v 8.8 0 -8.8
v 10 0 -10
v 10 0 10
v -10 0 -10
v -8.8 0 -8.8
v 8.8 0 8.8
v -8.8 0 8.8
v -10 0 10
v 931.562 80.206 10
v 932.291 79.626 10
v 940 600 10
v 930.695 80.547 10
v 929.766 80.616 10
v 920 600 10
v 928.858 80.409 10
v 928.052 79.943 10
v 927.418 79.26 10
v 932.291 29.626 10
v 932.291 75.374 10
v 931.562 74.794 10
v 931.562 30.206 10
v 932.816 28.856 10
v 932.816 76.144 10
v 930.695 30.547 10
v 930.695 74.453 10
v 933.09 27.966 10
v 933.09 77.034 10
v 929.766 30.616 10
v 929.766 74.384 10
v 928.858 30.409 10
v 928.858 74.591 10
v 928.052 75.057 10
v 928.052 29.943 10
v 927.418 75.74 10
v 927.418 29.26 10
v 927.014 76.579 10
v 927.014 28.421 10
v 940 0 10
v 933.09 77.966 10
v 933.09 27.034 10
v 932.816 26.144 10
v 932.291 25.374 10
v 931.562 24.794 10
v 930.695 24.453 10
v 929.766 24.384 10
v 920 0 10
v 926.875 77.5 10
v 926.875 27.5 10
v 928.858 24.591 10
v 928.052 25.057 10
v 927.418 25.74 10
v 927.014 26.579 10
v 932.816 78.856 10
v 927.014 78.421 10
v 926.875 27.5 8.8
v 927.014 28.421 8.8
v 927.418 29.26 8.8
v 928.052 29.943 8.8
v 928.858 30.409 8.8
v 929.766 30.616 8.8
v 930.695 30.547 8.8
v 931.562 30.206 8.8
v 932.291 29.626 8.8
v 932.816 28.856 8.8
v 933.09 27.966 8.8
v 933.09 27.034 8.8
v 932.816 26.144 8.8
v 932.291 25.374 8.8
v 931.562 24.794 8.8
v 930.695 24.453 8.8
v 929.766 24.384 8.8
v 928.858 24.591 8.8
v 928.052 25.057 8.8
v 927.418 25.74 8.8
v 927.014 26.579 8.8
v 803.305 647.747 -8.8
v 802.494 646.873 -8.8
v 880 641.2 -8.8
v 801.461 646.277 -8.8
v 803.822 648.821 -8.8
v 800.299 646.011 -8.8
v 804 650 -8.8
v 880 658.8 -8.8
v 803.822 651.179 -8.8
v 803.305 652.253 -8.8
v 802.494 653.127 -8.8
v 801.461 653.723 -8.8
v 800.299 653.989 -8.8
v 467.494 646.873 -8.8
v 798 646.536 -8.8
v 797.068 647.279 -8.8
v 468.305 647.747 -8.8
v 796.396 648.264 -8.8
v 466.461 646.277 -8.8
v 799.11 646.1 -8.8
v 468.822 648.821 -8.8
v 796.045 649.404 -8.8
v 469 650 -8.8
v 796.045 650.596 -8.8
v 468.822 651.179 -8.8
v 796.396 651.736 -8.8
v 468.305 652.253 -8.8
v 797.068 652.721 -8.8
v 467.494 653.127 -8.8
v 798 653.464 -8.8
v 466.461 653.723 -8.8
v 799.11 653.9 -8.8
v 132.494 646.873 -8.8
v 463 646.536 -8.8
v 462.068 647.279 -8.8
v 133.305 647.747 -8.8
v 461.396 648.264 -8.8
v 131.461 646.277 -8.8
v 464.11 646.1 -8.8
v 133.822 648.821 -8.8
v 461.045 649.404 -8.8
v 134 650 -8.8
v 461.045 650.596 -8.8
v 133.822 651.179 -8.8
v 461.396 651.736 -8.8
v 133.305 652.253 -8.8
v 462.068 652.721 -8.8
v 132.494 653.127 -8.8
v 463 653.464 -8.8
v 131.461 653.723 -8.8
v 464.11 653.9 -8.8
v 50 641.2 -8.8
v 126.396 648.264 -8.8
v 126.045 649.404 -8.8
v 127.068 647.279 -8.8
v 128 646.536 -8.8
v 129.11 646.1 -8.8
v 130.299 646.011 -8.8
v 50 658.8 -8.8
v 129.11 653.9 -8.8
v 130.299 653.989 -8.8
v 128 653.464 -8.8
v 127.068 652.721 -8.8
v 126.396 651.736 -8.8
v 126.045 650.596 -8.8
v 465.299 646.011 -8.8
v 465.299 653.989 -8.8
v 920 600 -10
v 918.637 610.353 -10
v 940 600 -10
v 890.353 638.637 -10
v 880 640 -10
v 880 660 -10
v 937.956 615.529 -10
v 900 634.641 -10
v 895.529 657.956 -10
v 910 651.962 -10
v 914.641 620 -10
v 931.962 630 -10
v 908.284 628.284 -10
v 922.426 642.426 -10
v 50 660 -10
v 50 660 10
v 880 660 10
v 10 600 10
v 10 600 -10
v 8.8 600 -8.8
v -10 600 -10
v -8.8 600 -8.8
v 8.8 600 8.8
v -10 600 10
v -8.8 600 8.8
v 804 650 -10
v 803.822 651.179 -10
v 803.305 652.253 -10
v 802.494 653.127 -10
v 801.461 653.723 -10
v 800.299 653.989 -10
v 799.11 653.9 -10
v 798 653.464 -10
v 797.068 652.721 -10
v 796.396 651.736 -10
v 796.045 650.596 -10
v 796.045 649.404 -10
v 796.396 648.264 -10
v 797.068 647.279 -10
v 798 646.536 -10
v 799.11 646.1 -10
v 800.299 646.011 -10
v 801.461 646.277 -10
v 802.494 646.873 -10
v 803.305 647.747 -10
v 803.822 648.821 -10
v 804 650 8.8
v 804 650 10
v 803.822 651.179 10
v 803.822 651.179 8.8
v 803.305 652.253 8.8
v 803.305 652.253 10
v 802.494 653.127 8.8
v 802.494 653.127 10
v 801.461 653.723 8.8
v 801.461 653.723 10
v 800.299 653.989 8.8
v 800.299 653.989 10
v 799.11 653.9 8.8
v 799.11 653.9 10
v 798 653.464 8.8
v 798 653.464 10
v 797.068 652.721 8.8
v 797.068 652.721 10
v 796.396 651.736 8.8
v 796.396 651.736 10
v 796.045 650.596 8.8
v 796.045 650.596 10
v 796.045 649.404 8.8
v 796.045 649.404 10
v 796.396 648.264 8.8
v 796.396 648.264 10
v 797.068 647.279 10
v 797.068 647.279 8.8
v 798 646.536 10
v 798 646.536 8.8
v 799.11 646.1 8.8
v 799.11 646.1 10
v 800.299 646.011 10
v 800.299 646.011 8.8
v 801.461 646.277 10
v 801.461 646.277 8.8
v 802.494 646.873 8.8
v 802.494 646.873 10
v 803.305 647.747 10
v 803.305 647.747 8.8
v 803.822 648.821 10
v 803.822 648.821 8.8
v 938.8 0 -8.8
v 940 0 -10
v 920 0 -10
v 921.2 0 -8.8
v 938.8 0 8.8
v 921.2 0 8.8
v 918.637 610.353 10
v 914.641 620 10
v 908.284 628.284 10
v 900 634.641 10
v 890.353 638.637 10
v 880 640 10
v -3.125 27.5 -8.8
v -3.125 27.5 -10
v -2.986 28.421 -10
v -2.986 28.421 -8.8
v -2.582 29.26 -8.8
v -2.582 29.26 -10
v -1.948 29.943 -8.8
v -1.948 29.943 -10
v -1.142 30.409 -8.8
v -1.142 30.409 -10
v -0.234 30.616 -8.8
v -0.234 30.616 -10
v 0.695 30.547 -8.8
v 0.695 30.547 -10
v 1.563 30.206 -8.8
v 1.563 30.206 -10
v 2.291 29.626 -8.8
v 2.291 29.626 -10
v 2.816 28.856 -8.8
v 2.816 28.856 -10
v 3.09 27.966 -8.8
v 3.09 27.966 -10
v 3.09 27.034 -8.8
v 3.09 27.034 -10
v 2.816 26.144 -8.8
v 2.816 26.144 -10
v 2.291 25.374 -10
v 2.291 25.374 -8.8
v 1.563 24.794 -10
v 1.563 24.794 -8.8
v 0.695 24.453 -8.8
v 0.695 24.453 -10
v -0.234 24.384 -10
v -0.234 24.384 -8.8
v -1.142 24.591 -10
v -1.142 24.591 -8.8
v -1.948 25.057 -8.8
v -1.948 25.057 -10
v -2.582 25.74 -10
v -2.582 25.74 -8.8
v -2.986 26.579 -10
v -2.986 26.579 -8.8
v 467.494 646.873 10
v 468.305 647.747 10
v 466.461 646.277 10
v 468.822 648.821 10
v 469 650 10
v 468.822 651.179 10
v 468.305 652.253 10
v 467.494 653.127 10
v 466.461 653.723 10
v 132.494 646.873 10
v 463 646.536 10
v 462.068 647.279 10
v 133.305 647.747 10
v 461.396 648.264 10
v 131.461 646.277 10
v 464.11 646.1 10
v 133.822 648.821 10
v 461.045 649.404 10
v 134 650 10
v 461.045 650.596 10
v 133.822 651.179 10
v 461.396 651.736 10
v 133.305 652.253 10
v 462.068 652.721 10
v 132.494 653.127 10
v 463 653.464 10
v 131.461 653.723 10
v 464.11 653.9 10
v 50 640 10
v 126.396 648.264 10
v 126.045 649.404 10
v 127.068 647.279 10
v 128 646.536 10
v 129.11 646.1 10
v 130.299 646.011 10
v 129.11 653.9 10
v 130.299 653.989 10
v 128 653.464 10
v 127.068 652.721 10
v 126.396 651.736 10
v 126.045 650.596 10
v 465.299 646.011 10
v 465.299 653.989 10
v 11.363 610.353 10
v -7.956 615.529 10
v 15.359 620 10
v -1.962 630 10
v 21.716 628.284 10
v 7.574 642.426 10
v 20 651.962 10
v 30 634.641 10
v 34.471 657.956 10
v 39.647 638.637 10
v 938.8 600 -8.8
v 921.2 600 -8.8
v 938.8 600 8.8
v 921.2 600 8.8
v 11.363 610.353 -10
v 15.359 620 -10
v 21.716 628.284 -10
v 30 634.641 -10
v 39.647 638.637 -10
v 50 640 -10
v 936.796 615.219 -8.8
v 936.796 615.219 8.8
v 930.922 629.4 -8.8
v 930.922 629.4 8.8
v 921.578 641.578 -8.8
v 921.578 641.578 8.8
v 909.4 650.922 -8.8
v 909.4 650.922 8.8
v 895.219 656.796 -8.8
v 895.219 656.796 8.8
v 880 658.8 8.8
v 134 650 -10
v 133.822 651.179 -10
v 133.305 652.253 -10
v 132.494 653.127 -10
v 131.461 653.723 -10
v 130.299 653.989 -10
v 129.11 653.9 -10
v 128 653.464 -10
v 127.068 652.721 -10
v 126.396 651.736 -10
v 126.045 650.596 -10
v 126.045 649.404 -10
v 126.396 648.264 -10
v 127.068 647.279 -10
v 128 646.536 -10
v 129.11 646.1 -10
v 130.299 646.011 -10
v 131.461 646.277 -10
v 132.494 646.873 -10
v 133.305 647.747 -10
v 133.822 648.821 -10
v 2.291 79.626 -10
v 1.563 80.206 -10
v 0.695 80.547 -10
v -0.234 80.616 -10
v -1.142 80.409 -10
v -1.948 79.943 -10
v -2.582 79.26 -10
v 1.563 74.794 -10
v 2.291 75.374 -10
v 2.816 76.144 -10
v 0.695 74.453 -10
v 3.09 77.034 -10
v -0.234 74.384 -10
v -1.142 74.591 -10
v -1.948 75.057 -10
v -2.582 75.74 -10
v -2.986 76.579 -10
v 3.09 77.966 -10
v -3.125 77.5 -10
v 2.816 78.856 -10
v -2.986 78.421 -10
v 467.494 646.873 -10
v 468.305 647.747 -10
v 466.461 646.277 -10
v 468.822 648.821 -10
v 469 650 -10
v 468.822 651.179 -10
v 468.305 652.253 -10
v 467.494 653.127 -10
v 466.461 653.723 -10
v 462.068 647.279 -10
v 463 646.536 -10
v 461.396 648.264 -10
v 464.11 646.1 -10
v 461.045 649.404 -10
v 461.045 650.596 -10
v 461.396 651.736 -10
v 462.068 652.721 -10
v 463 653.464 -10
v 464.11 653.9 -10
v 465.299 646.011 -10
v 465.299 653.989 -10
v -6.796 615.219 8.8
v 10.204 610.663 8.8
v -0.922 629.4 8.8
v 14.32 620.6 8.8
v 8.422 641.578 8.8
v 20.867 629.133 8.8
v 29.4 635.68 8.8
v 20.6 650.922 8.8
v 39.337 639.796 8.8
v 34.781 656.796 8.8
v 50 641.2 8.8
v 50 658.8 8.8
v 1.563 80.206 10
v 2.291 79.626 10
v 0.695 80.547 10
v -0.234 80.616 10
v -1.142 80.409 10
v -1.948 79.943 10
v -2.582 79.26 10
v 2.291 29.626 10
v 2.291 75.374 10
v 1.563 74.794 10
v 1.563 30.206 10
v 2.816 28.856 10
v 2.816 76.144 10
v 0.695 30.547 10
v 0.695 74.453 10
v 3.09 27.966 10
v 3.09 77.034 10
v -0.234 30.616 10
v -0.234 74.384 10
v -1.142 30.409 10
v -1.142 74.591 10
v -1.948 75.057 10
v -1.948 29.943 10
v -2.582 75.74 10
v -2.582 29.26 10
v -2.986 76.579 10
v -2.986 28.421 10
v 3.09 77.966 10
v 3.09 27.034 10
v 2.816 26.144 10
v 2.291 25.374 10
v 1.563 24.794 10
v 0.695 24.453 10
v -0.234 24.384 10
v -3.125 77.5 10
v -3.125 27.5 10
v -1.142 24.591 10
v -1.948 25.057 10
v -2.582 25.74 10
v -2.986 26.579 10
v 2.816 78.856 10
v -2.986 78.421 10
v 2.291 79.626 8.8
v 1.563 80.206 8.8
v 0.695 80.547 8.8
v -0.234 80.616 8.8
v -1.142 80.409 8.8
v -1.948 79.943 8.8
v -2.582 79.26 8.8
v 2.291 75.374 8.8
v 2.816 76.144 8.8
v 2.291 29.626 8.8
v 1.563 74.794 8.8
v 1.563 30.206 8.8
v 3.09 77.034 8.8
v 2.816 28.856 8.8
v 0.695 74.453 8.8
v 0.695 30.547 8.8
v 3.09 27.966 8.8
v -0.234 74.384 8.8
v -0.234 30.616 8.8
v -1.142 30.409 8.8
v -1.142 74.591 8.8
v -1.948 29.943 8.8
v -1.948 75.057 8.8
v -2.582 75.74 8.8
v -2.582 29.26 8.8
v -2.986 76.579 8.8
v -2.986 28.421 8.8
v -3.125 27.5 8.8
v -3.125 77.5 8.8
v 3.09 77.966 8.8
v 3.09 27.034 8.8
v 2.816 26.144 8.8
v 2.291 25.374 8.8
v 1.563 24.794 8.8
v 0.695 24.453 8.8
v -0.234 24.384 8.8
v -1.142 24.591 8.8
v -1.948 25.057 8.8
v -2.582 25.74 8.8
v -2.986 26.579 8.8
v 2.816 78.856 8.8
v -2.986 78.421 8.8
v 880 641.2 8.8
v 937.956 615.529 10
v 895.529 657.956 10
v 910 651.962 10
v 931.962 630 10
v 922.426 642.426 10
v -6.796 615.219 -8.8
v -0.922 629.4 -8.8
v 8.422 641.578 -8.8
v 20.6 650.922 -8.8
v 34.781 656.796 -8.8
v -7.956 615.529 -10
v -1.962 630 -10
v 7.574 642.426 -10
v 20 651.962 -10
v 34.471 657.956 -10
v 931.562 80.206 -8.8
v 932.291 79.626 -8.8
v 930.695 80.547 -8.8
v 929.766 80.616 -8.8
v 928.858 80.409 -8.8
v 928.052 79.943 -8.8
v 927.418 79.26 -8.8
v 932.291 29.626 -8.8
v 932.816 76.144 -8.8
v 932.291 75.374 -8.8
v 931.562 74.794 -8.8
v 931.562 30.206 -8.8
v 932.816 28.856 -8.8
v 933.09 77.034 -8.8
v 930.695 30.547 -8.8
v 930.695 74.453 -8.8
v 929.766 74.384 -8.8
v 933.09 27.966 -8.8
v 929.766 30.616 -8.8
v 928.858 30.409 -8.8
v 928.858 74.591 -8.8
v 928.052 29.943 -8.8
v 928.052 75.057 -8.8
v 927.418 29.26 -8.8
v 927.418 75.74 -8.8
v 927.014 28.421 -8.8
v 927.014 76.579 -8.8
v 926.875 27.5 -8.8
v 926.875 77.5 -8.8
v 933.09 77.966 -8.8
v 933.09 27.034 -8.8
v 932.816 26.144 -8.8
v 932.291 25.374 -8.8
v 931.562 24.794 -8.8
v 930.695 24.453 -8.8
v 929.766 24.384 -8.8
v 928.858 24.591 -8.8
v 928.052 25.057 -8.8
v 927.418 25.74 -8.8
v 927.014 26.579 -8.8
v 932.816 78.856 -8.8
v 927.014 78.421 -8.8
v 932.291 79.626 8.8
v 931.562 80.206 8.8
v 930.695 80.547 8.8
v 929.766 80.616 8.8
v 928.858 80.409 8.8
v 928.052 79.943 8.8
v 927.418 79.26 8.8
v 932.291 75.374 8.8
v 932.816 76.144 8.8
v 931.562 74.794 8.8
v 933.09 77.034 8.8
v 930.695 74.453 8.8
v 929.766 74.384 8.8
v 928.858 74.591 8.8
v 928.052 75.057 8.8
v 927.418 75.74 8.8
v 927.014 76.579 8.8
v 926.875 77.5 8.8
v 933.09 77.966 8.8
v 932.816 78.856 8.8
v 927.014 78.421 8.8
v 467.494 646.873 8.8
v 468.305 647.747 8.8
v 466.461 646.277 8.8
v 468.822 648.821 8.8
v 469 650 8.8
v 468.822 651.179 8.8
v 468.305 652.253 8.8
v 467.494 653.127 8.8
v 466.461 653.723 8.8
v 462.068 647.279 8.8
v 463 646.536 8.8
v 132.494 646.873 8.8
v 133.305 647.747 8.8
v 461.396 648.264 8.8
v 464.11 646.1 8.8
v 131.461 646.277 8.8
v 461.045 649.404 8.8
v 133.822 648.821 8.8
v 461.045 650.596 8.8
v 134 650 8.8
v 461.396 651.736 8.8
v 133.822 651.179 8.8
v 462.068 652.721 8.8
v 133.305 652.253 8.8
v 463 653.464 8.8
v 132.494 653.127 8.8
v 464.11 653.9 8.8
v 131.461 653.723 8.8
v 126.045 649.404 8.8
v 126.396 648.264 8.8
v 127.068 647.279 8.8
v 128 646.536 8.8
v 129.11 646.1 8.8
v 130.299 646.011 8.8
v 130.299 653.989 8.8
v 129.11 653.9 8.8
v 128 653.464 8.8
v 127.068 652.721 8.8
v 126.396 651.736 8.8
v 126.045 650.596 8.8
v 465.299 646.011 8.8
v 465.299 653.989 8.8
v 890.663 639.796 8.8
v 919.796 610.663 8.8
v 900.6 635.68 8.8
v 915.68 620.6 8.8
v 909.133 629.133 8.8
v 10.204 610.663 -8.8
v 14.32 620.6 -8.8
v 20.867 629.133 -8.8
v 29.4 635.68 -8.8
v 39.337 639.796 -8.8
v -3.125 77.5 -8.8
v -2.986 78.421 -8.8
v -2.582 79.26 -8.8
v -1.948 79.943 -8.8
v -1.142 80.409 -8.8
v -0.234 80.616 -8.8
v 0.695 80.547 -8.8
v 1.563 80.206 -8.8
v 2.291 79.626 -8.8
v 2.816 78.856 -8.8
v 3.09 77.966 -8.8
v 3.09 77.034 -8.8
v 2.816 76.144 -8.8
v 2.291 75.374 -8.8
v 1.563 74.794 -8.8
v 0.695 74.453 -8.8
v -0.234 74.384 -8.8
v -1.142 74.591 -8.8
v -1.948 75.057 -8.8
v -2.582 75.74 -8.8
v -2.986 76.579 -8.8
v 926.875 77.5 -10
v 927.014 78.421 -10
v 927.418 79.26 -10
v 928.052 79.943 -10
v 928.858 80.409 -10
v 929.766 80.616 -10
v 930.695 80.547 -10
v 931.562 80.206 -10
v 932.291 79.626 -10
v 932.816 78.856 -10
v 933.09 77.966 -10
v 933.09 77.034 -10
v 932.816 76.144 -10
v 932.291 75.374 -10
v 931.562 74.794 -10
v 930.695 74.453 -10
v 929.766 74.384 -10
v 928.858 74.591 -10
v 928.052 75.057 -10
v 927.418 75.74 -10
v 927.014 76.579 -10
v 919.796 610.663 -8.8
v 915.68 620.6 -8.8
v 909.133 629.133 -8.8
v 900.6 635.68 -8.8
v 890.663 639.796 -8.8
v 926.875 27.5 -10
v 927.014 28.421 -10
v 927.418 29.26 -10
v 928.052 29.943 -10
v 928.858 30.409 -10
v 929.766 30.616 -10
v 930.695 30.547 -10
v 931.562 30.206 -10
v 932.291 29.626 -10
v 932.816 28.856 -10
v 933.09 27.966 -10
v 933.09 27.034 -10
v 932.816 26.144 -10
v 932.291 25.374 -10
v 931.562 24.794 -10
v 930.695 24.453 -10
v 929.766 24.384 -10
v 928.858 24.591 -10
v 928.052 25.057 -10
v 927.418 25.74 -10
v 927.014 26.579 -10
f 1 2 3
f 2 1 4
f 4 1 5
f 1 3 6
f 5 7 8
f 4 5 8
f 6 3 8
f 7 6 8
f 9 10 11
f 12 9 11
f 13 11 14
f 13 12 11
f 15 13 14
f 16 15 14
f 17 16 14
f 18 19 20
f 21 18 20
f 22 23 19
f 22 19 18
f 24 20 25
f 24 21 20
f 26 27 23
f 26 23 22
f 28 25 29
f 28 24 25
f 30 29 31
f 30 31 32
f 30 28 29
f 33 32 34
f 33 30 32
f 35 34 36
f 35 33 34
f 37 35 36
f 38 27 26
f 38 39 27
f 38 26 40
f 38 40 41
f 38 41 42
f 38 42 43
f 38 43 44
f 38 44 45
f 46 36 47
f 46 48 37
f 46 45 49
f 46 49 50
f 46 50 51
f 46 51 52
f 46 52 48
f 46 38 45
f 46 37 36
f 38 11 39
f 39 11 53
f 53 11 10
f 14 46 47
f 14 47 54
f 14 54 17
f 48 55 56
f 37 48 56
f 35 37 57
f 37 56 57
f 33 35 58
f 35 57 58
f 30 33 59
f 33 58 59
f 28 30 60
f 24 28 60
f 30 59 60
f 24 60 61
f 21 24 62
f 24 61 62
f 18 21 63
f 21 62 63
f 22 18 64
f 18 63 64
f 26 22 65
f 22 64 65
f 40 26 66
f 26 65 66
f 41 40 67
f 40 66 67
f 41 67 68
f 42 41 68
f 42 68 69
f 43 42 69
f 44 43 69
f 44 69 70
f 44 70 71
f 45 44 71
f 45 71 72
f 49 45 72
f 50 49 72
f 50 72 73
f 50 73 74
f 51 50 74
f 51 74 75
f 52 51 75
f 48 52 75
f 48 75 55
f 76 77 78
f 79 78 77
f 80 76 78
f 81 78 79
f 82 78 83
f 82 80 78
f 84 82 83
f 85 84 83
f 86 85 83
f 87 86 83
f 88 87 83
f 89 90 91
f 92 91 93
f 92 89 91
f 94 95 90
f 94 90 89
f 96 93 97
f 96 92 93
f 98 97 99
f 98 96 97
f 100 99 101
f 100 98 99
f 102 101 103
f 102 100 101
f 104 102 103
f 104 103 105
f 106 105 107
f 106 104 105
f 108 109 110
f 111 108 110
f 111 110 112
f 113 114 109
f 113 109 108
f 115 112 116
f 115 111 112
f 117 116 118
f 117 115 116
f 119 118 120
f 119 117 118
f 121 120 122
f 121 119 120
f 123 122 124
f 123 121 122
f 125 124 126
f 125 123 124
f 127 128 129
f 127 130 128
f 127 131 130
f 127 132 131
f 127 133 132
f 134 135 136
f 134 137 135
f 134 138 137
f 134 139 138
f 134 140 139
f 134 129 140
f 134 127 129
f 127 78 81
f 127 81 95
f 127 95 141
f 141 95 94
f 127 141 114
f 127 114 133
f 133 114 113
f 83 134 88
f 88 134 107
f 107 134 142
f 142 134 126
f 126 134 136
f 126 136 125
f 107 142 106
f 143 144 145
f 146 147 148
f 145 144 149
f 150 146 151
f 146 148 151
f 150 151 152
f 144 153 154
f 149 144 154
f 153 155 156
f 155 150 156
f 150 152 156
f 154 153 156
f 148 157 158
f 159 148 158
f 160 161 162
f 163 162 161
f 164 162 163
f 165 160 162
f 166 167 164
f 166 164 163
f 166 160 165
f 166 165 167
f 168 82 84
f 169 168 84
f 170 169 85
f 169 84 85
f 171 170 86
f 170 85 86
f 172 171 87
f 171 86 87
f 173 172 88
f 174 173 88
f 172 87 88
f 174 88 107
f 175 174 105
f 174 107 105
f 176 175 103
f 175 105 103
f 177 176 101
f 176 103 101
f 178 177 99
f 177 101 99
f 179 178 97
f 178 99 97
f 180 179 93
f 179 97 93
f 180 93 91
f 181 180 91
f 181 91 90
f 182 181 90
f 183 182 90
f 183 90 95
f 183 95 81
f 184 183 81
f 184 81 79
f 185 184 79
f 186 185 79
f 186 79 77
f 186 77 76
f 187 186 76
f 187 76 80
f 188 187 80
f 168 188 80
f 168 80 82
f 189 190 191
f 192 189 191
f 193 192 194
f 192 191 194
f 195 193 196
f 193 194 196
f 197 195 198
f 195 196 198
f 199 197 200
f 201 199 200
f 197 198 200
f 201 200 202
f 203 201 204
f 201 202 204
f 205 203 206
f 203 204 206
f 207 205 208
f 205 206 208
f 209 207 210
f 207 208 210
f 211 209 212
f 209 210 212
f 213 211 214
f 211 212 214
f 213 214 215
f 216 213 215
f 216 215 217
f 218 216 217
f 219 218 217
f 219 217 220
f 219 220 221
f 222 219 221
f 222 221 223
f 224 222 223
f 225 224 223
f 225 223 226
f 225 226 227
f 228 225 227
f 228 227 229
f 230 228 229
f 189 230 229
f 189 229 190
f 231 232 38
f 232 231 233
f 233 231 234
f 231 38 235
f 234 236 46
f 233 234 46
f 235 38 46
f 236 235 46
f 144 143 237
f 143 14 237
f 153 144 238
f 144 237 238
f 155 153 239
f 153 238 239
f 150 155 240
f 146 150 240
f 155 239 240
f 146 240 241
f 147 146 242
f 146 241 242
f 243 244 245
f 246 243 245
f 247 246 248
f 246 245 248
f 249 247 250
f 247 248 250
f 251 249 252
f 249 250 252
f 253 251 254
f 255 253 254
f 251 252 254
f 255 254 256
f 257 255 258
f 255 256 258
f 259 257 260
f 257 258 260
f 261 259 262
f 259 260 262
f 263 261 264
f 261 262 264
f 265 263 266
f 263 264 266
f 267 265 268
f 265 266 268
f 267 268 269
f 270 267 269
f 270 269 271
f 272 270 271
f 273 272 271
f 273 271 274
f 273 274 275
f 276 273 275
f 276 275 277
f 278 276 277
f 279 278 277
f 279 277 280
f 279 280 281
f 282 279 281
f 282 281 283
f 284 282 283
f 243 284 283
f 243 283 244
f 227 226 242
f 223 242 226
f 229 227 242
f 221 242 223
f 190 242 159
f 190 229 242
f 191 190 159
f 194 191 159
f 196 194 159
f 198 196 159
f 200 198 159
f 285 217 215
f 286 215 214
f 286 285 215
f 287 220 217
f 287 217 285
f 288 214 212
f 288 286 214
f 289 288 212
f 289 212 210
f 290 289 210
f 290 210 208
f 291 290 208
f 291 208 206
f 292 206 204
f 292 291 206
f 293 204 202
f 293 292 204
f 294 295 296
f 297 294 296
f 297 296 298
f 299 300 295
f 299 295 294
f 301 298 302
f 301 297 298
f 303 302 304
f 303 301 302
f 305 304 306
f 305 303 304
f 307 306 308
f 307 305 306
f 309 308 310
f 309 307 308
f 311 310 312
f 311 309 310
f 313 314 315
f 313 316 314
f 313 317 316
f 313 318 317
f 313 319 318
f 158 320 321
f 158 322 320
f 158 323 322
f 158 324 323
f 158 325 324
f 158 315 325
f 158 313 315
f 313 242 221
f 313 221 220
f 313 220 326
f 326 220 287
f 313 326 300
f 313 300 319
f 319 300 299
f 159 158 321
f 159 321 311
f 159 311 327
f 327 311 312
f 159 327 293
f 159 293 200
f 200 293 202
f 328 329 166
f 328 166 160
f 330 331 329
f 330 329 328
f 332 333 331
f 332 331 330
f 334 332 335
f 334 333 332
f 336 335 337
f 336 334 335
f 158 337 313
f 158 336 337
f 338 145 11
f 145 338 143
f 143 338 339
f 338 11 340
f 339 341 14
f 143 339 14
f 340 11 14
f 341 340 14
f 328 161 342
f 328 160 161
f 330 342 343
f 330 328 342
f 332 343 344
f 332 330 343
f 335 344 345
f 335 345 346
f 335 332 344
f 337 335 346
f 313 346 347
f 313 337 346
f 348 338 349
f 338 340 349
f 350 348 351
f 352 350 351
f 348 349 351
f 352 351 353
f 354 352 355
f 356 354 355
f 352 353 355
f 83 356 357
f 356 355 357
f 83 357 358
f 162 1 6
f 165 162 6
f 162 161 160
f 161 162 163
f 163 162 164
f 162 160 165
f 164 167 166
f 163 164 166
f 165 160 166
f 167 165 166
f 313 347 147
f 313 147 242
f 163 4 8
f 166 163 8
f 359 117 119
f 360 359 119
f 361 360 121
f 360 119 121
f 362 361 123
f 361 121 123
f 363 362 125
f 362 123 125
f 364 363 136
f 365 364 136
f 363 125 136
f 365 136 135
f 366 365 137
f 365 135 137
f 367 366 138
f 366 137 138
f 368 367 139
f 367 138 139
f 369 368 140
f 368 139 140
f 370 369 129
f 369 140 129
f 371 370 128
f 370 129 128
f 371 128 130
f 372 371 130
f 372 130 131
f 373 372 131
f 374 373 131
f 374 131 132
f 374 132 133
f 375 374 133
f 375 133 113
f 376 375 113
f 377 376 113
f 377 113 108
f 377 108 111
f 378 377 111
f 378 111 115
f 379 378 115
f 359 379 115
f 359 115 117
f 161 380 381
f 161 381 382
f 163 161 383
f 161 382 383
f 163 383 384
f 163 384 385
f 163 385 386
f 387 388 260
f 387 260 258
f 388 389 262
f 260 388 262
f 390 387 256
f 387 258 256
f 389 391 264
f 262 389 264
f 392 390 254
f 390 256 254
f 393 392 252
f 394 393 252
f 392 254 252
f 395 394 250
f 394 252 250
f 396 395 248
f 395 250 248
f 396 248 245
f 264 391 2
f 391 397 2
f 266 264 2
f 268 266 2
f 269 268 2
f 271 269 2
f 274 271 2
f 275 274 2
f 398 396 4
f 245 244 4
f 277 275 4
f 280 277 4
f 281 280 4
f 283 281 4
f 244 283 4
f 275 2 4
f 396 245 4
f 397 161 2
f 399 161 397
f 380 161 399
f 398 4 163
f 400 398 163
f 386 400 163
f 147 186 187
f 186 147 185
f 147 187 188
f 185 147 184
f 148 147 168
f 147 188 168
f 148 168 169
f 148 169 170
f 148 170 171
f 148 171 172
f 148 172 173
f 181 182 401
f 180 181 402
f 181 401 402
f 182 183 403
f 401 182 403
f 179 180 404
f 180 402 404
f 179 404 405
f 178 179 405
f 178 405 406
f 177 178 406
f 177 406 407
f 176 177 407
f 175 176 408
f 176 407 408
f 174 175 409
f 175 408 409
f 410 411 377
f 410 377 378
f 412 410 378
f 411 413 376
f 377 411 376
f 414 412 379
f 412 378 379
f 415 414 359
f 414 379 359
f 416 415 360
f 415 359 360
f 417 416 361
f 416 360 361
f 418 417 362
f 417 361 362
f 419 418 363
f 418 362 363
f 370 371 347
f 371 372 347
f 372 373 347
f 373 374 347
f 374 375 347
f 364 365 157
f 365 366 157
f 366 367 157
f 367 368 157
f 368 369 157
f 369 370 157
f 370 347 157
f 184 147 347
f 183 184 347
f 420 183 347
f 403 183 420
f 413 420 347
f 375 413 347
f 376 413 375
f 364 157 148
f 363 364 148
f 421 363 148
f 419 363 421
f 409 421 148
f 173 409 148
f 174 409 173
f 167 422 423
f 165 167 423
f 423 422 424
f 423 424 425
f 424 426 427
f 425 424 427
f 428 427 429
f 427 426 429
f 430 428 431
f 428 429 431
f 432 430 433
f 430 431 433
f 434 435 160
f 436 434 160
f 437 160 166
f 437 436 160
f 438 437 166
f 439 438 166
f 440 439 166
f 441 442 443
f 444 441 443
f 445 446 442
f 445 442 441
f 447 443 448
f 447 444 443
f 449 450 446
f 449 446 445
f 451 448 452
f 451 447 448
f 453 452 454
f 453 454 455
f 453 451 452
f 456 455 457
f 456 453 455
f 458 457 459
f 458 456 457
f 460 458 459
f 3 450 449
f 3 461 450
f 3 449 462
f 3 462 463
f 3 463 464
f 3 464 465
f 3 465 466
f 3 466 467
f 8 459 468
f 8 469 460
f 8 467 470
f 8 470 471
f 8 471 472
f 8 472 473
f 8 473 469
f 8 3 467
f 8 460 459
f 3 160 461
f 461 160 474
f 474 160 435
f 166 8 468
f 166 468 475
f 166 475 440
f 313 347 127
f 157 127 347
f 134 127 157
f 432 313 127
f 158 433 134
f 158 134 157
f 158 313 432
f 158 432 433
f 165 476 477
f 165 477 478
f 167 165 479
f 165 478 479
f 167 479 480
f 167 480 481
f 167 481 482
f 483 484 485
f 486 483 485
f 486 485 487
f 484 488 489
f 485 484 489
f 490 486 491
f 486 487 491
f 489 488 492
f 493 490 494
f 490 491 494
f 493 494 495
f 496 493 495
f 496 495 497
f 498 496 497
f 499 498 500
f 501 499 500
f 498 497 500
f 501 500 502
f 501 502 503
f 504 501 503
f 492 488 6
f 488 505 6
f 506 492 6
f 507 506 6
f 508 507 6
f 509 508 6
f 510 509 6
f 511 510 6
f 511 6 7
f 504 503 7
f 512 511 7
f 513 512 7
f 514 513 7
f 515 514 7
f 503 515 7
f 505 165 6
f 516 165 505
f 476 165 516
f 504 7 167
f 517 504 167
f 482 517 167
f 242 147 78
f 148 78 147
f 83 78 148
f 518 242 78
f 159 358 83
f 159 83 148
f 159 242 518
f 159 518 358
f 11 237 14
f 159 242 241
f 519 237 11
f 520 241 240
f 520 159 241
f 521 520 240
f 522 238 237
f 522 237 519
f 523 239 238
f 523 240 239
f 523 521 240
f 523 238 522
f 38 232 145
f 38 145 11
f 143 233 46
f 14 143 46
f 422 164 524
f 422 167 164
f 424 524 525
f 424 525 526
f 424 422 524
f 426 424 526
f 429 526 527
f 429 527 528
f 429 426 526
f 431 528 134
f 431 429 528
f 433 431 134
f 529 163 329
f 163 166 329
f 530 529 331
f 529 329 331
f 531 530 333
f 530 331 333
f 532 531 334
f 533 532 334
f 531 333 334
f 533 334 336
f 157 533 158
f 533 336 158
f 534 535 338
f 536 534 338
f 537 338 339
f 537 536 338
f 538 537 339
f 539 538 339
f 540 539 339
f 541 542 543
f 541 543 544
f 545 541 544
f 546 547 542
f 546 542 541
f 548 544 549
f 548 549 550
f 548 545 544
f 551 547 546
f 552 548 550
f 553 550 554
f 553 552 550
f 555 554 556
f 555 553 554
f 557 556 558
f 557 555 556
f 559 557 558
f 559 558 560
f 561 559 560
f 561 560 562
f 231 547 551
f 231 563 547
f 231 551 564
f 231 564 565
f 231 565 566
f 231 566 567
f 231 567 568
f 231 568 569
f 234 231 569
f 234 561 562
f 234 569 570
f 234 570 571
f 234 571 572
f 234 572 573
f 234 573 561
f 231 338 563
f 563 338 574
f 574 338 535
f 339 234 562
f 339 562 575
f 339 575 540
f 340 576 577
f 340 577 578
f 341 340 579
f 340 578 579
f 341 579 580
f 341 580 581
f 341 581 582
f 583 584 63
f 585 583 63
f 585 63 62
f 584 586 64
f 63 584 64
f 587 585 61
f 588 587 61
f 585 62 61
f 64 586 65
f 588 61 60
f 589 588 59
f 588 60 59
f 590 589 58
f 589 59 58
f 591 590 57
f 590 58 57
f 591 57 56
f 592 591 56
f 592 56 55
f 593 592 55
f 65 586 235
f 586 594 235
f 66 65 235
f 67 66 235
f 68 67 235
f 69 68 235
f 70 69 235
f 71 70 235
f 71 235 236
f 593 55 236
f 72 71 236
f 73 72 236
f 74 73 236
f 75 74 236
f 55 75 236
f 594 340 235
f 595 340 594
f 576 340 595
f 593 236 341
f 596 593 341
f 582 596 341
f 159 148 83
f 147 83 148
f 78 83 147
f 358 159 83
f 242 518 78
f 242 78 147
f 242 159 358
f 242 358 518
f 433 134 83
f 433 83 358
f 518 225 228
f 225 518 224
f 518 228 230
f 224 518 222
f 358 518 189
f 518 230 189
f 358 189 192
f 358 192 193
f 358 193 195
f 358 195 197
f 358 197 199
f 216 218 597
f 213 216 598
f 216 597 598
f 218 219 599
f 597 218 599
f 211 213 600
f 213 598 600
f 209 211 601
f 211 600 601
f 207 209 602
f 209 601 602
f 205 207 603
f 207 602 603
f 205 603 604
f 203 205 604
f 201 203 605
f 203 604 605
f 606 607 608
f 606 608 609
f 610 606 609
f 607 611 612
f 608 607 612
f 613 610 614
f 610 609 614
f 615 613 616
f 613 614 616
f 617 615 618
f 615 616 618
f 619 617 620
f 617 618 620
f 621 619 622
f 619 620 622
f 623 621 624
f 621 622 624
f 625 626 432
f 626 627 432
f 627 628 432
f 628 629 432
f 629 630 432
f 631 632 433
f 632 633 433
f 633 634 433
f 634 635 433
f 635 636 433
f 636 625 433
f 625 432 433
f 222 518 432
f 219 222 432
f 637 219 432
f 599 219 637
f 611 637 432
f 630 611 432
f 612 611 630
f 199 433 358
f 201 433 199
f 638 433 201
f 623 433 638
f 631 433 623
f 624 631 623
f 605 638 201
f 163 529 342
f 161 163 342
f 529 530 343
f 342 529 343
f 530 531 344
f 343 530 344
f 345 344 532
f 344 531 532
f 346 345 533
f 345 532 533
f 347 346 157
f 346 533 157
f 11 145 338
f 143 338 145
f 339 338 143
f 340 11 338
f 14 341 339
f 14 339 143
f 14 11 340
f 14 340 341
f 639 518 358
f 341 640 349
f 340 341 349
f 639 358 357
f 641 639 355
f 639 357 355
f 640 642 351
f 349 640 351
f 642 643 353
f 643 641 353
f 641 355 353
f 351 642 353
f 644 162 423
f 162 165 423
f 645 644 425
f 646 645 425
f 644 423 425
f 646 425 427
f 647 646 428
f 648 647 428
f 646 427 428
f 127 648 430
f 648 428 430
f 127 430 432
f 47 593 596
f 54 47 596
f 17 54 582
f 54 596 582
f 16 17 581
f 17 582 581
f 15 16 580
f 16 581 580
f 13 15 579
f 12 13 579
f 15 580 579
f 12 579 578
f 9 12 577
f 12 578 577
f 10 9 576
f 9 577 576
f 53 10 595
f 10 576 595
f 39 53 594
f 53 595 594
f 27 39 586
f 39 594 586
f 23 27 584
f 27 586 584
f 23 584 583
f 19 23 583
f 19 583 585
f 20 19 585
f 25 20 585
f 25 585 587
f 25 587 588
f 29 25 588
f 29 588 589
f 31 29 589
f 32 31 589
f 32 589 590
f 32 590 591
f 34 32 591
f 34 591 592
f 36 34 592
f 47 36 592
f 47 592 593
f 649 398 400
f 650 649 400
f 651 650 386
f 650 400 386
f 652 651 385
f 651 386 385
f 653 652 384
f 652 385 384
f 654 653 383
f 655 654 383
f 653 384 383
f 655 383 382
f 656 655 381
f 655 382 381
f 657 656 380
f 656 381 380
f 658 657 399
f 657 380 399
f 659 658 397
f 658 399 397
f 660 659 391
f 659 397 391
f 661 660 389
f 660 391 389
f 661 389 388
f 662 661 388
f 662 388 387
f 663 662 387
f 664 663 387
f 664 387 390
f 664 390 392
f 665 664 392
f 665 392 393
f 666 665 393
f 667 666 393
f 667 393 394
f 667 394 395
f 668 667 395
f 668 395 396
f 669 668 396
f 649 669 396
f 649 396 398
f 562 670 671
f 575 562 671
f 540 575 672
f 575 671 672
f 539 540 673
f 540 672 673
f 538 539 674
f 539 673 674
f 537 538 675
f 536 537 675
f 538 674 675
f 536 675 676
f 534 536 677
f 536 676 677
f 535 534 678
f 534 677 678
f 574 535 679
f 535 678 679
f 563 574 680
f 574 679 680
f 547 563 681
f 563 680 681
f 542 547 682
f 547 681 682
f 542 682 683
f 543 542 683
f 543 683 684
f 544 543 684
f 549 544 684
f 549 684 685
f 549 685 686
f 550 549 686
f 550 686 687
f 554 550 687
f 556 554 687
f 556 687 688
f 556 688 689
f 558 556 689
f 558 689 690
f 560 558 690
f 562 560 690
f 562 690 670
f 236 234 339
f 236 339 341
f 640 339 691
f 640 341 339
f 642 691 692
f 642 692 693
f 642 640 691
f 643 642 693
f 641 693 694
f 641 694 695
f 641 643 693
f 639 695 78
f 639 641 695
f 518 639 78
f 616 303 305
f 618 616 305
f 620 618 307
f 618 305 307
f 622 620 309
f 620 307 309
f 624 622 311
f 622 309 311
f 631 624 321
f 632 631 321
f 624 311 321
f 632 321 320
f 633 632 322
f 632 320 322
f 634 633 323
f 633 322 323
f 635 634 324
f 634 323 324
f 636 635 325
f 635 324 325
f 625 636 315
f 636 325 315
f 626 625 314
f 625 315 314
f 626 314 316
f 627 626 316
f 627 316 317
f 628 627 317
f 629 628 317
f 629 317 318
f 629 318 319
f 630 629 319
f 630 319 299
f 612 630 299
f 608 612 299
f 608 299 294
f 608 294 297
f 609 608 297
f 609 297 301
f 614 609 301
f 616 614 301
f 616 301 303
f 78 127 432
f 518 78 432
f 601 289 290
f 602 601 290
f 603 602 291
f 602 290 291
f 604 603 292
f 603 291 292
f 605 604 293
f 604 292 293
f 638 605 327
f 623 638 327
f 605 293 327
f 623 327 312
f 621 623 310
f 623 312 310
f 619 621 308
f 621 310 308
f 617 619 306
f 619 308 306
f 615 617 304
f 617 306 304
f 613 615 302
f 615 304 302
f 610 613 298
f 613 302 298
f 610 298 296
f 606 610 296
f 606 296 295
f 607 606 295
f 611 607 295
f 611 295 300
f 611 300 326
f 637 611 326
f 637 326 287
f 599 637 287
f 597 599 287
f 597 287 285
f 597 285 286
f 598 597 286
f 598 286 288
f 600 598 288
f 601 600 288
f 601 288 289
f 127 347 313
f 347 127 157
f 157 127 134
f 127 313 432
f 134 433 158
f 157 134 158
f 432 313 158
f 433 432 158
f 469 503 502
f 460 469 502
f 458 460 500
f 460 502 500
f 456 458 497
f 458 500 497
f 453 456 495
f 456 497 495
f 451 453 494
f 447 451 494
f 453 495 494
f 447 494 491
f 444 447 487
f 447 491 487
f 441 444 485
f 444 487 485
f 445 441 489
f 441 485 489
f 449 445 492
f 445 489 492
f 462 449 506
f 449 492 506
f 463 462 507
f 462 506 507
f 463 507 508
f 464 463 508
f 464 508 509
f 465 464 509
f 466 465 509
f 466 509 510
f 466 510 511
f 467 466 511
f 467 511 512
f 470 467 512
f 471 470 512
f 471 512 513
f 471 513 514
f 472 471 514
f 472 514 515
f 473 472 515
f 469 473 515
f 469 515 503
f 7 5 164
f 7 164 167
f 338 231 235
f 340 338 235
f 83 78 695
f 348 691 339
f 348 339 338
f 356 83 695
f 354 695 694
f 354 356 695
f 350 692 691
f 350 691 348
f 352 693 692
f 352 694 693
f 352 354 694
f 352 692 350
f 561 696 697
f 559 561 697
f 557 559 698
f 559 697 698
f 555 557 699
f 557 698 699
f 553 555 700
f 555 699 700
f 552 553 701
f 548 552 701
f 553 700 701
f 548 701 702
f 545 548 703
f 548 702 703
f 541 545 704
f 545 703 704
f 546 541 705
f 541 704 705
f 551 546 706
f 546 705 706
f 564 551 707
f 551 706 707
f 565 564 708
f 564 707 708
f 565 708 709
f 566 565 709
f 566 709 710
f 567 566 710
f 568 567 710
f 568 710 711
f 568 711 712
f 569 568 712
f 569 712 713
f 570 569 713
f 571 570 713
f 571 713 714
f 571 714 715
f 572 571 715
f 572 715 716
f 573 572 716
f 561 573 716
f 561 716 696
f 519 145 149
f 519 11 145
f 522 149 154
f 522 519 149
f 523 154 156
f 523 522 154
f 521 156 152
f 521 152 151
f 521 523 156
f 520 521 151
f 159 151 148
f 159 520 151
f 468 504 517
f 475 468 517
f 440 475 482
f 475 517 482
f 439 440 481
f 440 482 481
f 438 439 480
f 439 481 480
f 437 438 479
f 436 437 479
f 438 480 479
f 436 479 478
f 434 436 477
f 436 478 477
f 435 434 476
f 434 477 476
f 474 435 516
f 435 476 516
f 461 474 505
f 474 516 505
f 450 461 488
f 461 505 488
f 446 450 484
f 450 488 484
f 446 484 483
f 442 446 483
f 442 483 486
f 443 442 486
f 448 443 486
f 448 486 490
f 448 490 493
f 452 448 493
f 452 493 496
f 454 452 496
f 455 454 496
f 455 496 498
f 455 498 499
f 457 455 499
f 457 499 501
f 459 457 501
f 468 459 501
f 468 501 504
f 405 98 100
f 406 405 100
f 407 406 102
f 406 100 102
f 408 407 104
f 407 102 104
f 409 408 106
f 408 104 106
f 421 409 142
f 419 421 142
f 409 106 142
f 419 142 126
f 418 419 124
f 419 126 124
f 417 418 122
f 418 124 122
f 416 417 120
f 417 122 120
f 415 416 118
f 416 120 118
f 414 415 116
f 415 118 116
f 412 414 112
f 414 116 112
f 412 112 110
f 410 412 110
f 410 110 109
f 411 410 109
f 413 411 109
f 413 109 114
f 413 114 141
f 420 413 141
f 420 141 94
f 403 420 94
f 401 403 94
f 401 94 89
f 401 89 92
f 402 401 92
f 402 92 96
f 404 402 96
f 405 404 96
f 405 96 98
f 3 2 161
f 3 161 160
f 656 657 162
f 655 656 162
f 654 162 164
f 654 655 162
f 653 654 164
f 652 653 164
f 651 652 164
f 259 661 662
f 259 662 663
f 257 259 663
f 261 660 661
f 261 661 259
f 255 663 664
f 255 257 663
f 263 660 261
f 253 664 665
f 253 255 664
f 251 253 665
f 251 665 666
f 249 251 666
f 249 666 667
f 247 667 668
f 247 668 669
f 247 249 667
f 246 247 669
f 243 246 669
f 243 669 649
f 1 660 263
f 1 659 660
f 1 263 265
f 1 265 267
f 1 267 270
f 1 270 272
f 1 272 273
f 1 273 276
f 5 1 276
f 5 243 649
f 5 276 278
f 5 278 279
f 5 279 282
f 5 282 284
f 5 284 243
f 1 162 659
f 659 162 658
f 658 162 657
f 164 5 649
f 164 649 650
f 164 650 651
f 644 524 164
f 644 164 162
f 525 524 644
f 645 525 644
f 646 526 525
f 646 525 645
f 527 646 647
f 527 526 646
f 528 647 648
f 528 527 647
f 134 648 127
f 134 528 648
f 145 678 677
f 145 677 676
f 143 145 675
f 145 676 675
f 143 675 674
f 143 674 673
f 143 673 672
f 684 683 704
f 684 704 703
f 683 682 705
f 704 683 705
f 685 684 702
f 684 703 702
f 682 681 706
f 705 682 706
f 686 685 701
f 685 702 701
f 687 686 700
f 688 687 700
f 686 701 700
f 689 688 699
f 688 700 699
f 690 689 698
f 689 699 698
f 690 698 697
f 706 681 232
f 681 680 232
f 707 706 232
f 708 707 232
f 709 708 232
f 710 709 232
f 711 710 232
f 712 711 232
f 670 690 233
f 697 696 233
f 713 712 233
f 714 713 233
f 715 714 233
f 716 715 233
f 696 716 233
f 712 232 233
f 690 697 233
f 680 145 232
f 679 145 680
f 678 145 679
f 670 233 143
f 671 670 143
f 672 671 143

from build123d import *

# Parameters (mm, degrees)
SKETCH15_W                                    = 20
SKETCH15_H                                    = 20
SKETCH15_W_2                                  = 17.6
SKETCH15_H_2                                  = 17.6
AL_TUBE_SQUARE_AL_TUBE_0_75_SQR_X_0_065_DEPTH = 600
SKETCH15_ON_SEGMENT_2_W                       = 20
SKETCH15_ON_SEGMENT_2_H                       = 20
SKETCH15_ON_SEGMENT_2_W_2                     = 17.6
SKETCH15_ON_SEGMENT_2_H_2                     = 17.6
AL_TUBE_SQUARE_AL_TUBE_0_75_SQR_X_0_2_ANGLE   = 90
SKETCH15_ON_SEGMENT_3_W                       = 20
SKETCH15_ON_SEGMENT_3_H                       = 20
SKETCH15_ON_SEGMENT_3_W_2                     = 17.6
SKETCH15_ON_SEGMENT_3_H_2                     = 17.6
AL_TUBE_SQUARE_AL_TUBE_0_75_SQR_X_0_3_DEPTH   = 830
SKETCH15_ON_SEGMENT_4_W                       = 20
SKETCH15_ON_SEGMENT_4_H                       = 20
SKETCH15_ON_SEGMENT_4_W_2                     = 17.6
SKETCH15_ON_SEGMENT_4_H_2                     = 17.6
AL_TUBE_SQUARE_AL_TUBE_0_75_SQR_X_0_4_ANGLE   = 90
SKETCH15_ON_SEGMENT_5_W                       = 20
SKETCH15_ON_SEGMENT_5_H                       = 20
SKETCH15_ON_SEGMENT_5_W_2                     = 17.6
SKETCH15_ON_SEGMENT_5_H_2                     = 17.6
AL_TUBE_SQUARE_AL_TUBE_0_75_SQR_X_0_5_DEPTH   = 600
SKETCH16_R                                    = 4
CUT_EXTRUDE1_DEPTH                            = 1149.738438462
SKETCH17_R                                    = 3.125
CUT_EXTRUDE2_DEPTH                            = 1149.738438462


with BuildPart() as part:
    # Sketch15 → Al tube square AL TUBE 0.75 SQR X 0.065 WALL(1) (new body)
    with BuildSketch(Plane(origin=(0, 0, 0), x_dir=(-1, 0, 0), z_dir=(0, 1, 0))):
        Rectangle(SKETCH15_W, SKETCH15_H)
        Rectangle(SKETCH15_W_2, SKETCH15_H_2, mode=Mode.SUBTRACT)
    extrude(amount=AL_TUBE_SQUARE_AL_TUBE_0_75_SQR_X_0_065_DEPTH)


with BuildPart() as body_2:
    # Sketch15 on segment 2 (carried to the start of arc 2) → Al tube square AL TUBE 0.75 SQR X 0. 2 (revolve)
    with BuildSketch(Plane(origin=(0, 600, 0), x_dir=(-1, 0, 0), z_dir=(0, 1, 0))):
        Rectangle(SKETCH15_ON_SEGMENT_2_W, SKETCH15_ON_SEGMENT_2_H)
        Rectangle(SKETCH15_ON_SEGMENT_2_W_2, SKETCH15_ON_SEGMENT_2_H_2, mode=Mode.SUBTRACT)
    revolve(axis=Axis((50, 600, 0), (0, 0, -1)), revolution_arc=AL_TUBE_SQUARE_AL_TUBE_0_75_SQR_X_0_2_ANGLE)


with BuildPart() as body_3:
    # Sketch15 on segment 3 (carried to segment 3) → Al tube square AL TUBE 0.75 SQR X 0. 3 (new body)
    with BuildSketch(Plane(origin=(50, 650, 0), x_dir=(0, 1, 0), z_dir=(1, 0, 0))):
        Rectangle(SKETCH15_ON_SEGMENT_3_W, SKETCH15_ON_SEGMENT_3_H)
        Rectangle(SKETCH15_ON_SEGMENT_3_W_2, SKETCH15_ON_SEGMENT_3_H_2, mode=Mode.SUBTRACT)
    extrude(amount=AL_TUBE_SQUARE_AL_TUBE_0_75_SQR_X_0_3_DEPTH)

    # Sketch16 → Cut-Extrude1 (cut, through all)
    with BuildSketch(Plane.XY.offset(10)):
        with Locations((130, 650)):
            Circle(SKETCH16_R)
        with Locations((800, 650)):
            Circle(SKETCH16_R)
        with Locations((465, 650)):
            Circle(SKETCH16_R)
    extrude(amount=-CUT_EXTRUDE1_DEPTH, mode=Mode.SUBTRACT)


with BuildPart() as body_4:
    # Sketch15 on segment 4 (carried to the start of arc 4) → Al tube square AL TUBE 0.75 SQR X 0. 4 (revolve)
    with BuildSketch(Plane(origin=(930, 600, 0), x_dir=(-1, 0, 0), z_dir=(0, 1, 0))):
        Rectangle(SKETCH15_ON_SEGMENT_4_W, SKETCH15_ON_SEGMENT_4_H)
        Rectangle(SKETCH15_ON_SEGMENT_4_W_2, SKETCH15_ON_SEGMENT_4_H_2, mode=Mode.SUBTRACT)
    revolve(axis=Axis((880, 600, 0), (0, 0, 1)), revolution_arc=AL_TUBE_SQUARE_AL_TUBE_0_75_SQR_X_0_4_ANGLE)


with BuildPart() as body_5:
    # Sketch15 on segment 5 (carried to segment 5) → Al tube square AL TUBE 0.75 SQR X 0. 5 (new body)
    with BuildSketch(Plane(origin=(930, 0, 0), x_dir=(-1, 0, 0), z_dir=(0, 1, 0))):
        Rectangle(SKETCH15_ON_SEGMENT_5_W, SKETCH15_ON_SEGMENT_5_H)
        Rectangle(SKETCH15_ON_SEGMENT_5_W_2, SKETCH15_ON_SEGMENT_5_H_2, mode=Mode.SUBTRACT)
    extrude(amount=AL_TUBE_SQUARE_AL_TUBE_0_75_SQR_X_0_5_DEPTH)


with BuildPart() as cut_extrude2_tool:
    # Sketch17 → Cut-Extrude2 (new, through all)
    with BuildSketch(Plane(origin=(0, 0, -10), x_dir=(-1, 0, 0), z_dir=(0, 0, -1))):
        with Locations((-930, 27.5)):
            Circle(SKETCH17_R)
        with Locations((-930, 77.5)):
            Circle(SKETCH17_R)
        with Locations((0, 77.5)):
            Circle(SKETCH17_R)
        with Locations((0, 27.5)):
            Circle(SKETCH17_R)
    extrude(amount=-CUT_EXTRUDE2_DEPTH)


with BuildPart() as part_1:
    add(part.part)

    # Cut-Extrude2: cut by cut_extrude2_tool
    add(cut_extrude2_tool.part, mode=Mode.SUBTRACT)


with BuildPart() as body_5_1:
    add(body_5.part)

    # Cut-Extrude2: cut by cut_extrude2_tool
    add(cut_extrude2_tool.part, mode=Mode.SUBTRACT)


solid = Compound([body_2.part, body_3.part, body_4.part, part_1.part, body_5_1.part])
